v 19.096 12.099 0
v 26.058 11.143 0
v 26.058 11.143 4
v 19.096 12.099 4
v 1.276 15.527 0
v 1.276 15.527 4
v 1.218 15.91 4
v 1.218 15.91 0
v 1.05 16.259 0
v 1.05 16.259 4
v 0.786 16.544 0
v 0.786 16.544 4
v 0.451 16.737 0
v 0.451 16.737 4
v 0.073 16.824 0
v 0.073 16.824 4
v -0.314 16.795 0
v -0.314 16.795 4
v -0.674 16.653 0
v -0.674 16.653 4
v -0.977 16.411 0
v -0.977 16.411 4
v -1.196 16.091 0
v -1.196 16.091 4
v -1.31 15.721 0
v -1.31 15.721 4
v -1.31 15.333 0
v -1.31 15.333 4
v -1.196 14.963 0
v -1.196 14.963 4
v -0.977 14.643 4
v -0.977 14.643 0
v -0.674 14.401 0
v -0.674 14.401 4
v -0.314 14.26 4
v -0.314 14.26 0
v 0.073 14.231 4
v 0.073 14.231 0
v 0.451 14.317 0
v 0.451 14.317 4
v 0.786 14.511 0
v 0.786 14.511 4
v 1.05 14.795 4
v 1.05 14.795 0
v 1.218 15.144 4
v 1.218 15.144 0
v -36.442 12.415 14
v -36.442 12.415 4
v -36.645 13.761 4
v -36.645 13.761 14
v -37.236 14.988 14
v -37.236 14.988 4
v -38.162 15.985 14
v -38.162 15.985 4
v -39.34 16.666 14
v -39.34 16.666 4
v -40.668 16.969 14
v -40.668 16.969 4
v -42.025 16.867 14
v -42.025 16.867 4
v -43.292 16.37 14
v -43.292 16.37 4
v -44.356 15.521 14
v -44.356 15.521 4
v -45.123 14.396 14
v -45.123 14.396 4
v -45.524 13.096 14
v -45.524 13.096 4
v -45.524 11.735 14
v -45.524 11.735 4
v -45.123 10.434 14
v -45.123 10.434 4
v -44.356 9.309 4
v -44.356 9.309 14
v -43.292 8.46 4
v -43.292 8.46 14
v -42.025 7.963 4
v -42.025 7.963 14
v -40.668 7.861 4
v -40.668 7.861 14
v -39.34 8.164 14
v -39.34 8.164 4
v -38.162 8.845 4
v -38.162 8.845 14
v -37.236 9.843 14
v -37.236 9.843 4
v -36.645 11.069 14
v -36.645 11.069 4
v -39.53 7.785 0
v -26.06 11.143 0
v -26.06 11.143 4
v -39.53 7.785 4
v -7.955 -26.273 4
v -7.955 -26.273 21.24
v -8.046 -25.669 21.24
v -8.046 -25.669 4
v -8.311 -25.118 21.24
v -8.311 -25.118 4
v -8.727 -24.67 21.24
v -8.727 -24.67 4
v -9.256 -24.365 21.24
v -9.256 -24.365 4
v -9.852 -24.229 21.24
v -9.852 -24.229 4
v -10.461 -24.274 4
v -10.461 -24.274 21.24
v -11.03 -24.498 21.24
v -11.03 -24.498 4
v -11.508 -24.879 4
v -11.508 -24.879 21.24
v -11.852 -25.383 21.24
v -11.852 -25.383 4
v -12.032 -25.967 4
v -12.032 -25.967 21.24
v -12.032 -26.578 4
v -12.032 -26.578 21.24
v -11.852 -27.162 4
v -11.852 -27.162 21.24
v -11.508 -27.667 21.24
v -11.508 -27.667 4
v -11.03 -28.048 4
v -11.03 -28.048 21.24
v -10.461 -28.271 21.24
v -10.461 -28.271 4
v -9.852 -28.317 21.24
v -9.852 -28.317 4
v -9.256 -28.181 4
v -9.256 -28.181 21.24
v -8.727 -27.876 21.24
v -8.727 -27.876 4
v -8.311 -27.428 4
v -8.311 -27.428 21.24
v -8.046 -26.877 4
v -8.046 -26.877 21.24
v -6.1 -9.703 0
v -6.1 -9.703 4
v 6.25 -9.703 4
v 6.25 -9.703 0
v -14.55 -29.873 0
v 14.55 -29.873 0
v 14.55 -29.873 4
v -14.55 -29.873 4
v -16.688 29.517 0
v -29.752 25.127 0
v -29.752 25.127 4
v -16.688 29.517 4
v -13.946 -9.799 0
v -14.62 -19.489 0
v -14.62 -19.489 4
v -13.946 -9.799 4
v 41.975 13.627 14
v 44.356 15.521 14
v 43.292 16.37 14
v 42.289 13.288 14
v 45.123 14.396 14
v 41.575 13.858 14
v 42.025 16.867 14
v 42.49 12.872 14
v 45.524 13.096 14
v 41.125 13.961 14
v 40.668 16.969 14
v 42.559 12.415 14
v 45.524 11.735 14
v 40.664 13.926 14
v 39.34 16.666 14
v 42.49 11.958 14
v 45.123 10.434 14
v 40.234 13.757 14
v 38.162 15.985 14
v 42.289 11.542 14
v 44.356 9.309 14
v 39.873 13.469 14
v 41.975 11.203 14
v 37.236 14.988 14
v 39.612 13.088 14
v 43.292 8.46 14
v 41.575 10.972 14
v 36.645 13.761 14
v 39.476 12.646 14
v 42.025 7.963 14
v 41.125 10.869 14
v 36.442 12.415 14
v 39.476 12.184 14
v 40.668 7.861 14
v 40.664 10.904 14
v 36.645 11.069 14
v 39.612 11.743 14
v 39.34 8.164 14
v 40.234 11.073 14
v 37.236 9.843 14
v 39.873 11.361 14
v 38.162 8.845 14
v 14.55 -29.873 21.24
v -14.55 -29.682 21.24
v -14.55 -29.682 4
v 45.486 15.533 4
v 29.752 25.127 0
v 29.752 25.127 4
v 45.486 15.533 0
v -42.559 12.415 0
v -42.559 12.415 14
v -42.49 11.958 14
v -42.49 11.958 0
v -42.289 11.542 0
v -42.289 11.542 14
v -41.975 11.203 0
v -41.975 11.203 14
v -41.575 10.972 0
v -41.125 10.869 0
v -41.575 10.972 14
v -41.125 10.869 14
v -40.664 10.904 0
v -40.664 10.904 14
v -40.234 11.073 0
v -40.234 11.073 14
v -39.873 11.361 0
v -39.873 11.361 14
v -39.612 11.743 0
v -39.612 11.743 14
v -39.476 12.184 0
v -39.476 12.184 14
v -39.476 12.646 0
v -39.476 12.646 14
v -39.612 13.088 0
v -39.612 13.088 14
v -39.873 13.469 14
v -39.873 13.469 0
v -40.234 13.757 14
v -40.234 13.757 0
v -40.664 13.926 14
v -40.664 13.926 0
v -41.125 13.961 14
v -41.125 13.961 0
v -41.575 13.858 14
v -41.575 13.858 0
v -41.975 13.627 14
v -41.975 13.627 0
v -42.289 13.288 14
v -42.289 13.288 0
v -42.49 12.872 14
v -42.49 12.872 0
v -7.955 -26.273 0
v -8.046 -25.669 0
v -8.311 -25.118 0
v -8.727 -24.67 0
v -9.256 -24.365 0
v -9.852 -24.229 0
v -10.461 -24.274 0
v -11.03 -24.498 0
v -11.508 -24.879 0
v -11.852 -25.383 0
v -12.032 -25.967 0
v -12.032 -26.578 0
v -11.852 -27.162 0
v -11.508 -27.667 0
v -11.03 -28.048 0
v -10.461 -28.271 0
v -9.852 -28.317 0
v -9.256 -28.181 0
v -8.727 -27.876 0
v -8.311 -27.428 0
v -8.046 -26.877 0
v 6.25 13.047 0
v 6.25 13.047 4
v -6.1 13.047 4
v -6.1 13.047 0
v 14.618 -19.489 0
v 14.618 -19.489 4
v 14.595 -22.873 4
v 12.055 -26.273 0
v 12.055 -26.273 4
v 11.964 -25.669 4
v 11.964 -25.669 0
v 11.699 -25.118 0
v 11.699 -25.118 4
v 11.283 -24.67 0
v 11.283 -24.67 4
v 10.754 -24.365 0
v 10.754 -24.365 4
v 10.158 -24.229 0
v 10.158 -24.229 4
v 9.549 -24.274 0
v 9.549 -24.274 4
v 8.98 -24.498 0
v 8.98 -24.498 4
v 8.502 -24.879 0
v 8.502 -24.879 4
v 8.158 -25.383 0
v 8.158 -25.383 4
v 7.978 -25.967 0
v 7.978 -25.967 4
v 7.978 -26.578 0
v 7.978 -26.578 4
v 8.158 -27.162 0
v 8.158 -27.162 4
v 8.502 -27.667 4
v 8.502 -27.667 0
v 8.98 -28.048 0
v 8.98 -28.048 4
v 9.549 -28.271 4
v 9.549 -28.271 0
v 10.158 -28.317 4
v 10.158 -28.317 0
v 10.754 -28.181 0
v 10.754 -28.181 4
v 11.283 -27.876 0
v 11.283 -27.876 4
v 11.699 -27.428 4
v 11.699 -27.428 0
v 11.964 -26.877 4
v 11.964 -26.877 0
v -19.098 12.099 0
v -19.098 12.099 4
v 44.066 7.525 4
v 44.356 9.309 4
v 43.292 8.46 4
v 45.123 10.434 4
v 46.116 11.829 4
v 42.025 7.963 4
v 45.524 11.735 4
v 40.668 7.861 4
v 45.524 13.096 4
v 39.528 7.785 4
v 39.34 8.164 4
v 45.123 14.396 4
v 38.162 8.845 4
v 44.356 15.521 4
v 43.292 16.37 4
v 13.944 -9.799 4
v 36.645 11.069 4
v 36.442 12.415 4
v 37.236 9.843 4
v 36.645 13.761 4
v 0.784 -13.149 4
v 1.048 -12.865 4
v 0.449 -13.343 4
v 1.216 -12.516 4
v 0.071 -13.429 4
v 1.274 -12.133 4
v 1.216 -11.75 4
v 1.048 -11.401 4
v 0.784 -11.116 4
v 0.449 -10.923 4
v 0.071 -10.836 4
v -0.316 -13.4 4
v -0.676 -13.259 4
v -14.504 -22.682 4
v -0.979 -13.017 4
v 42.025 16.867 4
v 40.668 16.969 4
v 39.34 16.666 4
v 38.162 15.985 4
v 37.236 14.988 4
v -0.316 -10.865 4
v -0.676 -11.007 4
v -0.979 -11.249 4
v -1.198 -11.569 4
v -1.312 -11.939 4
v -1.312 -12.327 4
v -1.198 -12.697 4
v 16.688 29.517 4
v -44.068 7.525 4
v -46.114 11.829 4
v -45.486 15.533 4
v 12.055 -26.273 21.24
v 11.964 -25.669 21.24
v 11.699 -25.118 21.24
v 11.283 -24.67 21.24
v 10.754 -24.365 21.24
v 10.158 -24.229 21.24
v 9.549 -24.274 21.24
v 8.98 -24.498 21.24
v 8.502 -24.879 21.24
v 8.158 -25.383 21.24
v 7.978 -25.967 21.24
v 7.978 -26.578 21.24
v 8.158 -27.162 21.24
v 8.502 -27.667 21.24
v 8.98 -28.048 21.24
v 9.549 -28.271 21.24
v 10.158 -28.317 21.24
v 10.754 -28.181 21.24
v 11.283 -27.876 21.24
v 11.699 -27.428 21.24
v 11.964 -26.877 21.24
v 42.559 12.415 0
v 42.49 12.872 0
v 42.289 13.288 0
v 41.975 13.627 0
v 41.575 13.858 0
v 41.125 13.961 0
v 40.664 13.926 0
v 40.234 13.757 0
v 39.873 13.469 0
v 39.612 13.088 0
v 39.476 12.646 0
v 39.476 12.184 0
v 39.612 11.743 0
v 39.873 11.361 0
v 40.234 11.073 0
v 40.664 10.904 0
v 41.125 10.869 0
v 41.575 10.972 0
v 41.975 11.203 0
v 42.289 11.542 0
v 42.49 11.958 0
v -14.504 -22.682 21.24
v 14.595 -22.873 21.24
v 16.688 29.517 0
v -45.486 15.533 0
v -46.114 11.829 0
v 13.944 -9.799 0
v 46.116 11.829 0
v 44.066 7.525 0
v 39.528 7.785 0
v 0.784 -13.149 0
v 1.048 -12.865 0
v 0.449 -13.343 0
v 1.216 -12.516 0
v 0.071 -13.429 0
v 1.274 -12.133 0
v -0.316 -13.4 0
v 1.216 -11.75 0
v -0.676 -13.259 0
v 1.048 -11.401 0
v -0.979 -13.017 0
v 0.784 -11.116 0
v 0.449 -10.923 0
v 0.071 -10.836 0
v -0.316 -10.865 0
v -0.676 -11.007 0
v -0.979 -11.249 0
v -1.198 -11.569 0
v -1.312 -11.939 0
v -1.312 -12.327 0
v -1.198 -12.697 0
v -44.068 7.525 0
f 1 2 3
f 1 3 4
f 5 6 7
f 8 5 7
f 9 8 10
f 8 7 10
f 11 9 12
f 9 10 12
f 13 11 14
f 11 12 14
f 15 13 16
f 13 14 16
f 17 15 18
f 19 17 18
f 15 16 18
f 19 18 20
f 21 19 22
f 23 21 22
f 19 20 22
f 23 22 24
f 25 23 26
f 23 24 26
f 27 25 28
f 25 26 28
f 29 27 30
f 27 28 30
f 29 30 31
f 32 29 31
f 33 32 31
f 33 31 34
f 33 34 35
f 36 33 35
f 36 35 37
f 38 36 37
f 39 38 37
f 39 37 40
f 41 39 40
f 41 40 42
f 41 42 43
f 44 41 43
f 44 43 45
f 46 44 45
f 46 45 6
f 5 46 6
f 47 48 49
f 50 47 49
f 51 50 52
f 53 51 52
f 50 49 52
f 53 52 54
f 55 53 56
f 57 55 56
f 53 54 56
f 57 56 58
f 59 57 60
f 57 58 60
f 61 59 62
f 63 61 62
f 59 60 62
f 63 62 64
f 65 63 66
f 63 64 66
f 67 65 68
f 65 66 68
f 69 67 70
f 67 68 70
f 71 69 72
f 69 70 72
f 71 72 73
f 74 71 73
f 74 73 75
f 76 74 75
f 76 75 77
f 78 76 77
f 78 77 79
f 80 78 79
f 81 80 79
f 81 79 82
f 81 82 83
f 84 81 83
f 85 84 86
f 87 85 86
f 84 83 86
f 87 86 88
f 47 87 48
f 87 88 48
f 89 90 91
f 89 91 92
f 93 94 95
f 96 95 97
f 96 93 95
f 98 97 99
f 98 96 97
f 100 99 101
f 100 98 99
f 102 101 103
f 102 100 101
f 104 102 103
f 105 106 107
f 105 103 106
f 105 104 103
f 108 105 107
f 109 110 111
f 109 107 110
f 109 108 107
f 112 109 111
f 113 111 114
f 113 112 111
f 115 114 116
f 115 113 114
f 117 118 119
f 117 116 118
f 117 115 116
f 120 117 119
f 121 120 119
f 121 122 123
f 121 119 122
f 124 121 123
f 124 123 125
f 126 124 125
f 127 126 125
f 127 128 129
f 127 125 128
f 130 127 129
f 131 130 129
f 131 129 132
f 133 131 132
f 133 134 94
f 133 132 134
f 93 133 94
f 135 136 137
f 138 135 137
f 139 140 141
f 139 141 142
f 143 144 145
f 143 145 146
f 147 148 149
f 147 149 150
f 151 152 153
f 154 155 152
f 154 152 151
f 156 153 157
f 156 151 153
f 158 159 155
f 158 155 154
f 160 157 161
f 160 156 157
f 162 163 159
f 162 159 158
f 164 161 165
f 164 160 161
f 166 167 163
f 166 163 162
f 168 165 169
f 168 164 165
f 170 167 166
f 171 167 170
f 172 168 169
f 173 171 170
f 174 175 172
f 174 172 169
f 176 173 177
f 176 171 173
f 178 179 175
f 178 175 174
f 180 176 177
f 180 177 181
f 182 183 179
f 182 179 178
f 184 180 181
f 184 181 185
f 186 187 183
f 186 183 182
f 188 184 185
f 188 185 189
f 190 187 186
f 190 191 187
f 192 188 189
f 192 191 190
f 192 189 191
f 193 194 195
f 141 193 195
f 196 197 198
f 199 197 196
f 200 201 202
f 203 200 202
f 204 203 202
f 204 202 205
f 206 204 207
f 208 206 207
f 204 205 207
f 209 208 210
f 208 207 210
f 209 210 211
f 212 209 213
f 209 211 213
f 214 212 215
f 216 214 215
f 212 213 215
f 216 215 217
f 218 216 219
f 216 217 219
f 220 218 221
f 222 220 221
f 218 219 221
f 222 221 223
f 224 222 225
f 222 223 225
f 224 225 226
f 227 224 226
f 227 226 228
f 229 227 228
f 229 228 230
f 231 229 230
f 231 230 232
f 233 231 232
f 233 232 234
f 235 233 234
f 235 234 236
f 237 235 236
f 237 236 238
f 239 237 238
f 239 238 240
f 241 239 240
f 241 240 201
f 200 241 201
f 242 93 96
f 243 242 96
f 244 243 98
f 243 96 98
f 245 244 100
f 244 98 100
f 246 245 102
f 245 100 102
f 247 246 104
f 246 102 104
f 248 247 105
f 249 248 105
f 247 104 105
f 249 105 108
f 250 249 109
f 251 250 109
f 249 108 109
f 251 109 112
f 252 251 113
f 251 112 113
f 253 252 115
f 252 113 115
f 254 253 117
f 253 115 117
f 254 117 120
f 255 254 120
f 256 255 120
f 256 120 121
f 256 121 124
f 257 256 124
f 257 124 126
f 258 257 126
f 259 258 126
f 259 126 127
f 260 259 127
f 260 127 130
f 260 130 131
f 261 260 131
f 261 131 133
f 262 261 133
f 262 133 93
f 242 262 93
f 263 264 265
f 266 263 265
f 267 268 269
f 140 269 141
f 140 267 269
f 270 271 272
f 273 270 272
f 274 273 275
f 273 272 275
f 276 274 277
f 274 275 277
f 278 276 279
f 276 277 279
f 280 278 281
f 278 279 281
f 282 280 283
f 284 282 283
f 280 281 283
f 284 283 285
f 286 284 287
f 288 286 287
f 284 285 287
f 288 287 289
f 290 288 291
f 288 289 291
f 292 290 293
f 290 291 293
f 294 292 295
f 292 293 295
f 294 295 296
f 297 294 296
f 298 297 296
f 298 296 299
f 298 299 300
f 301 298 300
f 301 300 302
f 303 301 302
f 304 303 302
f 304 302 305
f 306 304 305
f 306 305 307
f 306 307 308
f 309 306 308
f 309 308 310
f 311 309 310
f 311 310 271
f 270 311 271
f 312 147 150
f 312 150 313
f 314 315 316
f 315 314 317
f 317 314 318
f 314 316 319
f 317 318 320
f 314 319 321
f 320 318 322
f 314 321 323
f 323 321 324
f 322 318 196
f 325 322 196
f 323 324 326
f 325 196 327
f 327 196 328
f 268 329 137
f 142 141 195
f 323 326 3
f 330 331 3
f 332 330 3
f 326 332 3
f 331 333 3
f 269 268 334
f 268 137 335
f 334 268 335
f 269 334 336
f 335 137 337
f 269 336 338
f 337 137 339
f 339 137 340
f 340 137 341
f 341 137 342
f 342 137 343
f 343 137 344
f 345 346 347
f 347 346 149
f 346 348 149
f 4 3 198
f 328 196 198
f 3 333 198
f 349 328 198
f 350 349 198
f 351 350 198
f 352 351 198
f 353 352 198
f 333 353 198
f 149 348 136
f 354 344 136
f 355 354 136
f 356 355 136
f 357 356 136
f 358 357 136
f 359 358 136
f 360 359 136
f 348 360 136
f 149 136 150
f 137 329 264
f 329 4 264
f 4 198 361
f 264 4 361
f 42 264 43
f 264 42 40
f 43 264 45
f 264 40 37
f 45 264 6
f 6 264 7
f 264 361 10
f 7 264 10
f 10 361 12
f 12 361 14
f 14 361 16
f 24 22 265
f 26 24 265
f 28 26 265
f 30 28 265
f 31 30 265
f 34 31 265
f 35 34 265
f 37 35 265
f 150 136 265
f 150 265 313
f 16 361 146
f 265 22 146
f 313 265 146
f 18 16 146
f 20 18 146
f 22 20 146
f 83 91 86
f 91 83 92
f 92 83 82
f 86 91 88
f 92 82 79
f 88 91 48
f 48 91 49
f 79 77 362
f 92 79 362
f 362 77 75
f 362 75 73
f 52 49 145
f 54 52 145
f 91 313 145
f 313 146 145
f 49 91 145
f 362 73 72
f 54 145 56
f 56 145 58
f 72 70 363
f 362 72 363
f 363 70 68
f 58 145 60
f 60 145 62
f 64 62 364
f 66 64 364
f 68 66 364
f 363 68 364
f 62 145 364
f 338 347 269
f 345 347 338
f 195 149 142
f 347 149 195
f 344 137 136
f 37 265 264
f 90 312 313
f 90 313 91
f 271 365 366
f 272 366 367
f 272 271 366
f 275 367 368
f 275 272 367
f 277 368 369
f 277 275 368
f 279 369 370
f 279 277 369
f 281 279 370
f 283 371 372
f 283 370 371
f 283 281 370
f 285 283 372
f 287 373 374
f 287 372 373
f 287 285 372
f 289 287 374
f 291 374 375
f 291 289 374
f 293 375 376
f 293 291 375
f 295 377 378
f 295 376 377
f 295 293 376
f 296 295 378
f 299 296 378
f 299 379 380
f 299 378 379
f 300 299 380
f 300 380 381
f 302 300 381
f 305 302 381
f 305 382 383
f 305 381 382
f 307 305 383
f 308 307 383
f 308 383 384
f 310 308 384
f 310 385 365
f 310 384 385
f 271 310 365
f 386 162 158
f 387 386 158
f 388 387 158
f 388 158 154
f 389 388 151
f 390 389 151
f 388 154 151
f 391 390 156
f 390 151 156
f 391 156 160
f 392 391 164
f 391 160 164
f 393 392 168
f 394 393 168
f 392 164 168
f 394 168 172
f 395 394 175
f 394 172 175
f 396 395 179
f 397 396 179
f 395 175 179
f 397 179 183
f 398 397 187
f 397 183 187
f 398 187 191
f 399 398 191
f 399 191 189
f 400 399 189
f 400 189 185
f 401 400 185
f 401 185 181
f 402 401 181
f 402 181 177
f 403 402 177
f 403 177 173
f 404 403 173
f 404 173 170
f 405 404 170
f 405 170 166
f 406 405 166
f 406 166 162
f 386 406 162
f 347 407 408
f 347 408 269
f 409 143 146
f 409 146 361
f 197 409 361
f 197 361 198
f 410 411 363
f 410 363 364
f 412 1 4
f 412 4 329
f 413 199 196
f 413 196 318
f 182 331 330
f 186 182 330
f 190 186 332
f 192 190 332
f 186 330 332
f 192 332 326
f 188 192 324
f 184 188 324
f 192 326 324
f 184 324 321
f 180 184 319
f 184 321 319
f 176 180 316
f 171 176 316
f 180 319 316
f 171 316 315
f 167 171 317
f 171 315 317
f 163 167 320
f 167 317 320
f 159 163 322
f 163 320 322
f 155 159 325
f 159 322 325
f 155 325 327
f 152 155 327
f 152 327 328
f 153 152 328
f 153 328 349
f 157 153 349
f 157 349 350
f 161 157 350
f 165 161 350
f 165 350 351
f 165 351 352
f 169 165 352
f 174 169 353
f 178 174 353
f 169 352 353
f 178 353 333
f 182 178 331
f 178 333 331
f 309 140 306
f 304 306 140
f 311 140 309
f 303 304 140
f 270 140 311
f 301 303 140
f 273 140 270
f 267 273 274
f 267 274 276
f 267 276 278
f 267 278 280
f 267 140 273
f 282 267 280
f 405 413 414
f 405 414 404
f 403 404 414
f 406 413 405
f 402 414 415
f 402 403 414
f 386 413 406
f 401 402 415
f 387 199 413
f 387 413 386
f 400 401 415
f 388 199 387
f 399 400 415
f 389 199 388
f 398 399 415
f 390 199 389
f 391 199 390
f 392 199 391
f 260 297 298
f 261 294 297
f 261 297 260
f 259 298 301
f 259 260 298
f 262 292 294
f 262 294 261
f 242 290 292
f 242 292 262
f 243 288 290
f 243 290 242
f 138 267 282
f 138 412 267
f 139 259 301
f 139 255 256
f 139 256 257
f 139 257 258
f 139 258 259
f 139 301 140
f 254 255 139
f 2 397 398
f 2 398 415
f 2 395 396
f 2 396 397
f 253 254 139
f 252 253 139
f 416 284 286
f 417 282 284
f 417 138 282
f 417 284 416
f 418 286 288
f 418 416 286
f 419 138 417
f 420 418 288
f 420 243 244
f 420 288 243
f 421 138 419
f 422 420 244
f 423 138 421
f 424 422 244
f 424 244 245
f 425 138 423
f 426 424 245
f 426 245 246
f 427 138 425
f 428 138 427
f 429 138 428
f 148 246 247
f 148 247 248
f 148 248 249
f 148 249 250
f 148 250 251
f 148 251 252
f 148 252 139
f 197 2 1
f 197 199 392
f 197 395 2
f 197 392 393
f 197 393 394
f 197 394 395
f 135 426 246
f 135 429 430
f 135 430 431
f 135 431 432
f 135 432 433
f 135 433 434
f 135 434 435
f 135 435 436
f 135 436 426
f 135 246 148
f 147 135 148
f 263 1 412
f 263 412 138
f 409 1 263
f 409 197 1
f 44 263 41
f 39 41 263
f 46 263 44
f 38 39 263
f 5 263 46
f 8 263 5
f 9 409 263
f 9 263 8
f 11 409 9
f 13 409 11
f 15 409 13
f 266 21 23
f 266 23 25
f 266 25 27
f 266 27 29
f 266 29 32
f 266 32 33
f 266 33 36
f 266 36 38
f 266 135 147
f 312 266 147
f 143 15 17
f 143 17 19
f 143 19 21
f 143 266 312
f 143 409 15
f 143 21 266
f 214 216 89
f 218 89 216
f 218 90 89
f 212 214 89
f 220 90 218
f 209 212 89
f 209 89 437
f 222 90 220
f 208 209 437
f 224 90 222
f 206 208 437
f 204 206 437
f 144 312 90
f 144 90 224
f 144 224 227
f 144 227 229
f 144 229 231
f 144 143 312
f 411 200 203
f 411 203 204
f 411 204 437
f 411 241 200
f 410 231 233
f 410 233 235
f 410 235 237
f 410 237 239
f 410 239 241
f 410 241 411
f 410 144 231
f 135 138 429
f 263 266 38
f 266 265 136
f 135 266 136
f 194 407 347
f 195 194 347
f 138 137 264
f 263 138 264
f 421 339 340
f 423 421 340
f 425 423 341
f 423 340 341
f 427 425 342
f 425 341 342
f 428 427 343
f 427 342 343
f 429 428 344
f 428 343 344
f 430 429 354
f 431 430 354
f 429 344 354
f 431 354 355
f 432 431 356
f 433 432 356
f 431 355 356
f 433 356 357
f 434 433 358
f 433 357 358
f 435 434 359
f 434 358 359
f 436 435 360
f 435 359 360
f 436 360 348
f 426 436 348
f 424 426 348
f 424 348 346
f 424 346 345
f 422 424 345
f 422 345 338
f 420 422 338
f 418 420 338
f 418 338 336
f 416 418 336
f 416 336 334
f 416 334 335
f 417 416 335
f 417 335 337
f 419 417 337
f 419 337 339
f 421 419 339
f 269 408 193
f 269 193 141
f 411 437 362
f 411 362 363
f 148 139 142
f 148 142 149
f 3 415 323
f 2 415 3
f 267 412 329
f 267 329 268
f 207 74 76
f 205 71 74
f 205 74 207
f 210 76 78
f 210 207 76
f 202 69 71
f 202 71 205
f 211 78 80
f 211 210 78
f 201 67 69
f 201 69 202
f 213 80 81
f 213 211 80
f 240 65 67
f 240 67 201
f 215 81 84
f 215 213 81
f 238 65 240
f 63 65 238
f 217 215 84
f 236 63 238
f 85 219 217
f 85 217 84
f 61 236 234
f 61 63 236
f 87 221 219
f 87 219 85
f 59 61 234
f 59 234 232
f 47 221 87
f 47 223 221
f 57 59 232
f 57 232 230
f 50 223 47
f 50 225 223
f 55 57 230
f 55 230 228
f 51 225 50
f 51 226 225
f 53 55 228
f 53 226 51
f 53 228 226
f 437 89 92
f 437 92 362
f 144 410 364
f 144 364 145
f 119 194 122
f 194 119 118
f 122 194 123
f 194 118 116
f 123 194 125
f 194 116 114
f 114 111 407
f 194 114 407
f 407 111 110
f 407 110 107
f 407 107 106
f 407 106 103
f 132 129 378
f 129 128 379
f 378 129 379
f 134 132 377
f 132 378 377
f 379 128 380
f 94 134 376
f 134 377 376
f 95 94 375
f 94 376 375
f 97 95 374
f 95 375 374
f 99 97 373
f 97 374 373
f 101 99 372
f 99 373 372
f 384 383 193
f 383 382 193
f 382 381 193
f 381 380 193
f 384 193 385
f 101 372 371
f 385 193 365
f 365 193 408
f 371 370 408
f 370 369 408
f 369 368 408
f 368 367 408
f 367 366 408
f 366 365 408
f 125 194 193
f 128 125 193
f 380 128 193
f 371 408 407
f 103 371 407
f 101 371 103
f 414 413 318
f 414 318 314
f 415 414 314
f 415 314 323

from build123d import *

# Parameters (mm, degrees)
BOSS_EXTRUDE1_DEPTH = 4
SKETCH2_W           = 12.35
SKETCH2_H           = 22.75
SKETCH2_W_2         = 12.2
SKETCH2_H_2         = 22.6
CUT_EXTRUDE10_DEPTH = 56.09122169
SKETCH6_R           = 4.5665
BOSS_EXTRUDE3_DEPTH = 10
SKETCH4_R           = 2.05
CUT_EXTRUDE11_DEPTH = 9.65
SKETCH15_R          = 1.3
CUT_EXTRUDE13_DEPTH = 9.65
SKETCH20_W          = 17.24
SKETCH20_H          = 7
BOSS_EXTRUDE4_DEPTH = 29.1
SKETCH14_R          = 2.05
CUT_EXTRUDE16_DEPTH = 58.586980363
SKETCH17_R          = 1.55
CUT_EXTRUDE17_DEPTH = 57.701346609


with BuildPart() as part:
    # Sketch1 → Boss-Extrude1 (new body)
    with BuildSketch(Plane.XY):
        Polygon((-16.687663097, 29.51713681), (16.687663097, 29.51713681), (29.751665716, 25.127138307), (45.48566771, 15.533136266), (46.115666453, 11.829137748), (44.06566621, 7.52513699), (39.527662855, 7.785135244), (26.057661336, 11.143136948), (19.095663738, 12.099134391), (13.943658967, -9.798863607), (14.617658977, -19.488863352), (14.549662185, -29.872864189), (-14.549662185, -29.872864189), (-14.619662252, -19.488863352), (-13.945660379, -9.798863607), (-19.097663288, 12.099134391), (-26.059662749, 11.143136948), (-39.529662405, 7.785135244), (-44.067662035, 7.52513699), (-46.113662247, 11.829137748), (-45.485663985, 15.533136266), (-29.75166199, 25.127138307), align=None)
    extrude(amount=BOSS_EXTRUDE1_DEPTH)

    # Sketch2 → Cut-Extrude10 (cut, through all)
    with BuildSketch(Plane.XY.offset(4)):
        with Locations((0.075, 1.67213681)):
            Rectangle(SKETCH2_W, SKETCH2_H)
        with Locations((0, 1.74713681)):
            Rectangle(SKETCH2_W_2, SKETCH2_H_2)
    extrude(amount=-CUT_EXTRUDE10_DEPTH, mode=Mode.SUBTRACT)

    # Sketch6 → Boss-Extrude3 (add)
    with BuildSketch(Plane.XY.offset(4)):
        with Locations((-41.008819859, 12.415108178)):
            Circle(SKETCH6_R)
        with Locations(Location((41.008819859, 12.415108178, 0), (0, 0, 180))):
            Circle(SKETCH6_R)
    extrude(amount=BOSS_EXTRUDE3_DEPTH)

    # Sketch4 → Cut-Extrude11 (cut)
    with BuildSketch(Plane.XY.offset(4)):
        with Locations((10.005, -26.272864189)):
            Circle(SKETCH4_R)
        with Locations((-10.005, -26.272864189)):
            Circle(SKETCH4_R)
    extrude(amount=-CUT_EXTRUDE11_DEPTH, mode=Mode.SUBTRACT)

    # Sketch15 → Cut-Extrude13 (cut)
    with BuildSketch(Plane.XY.offset(4)):
        with Locations((-0.026341033, -12.13286319)):
            Circle(SKETCH15_R)
        with Locations((-0.024336262, 15.52713681)):
            Circle(SKETCH15_R)
    extrude(amount=-CUT_EXTRUDE13_DEPTH, mode=Mode.SUBTRACT)

    # Sketch20 → Boss-Extrude4 (add)
    with BuildSketch(Plane(origin=(14.744644235, -0.096551274, 0), x_dir=(0, 0, -1), z_dir=(0.9999785610524021, -0.006548086405005186, 0))):
        with Locations((-12.62, -26.276951301)):
            Rectangle(SKETCH20_W, SKETCH20_H)
    extrude(amount=-BOSS_EXTRUDE4_DEPTH)

    # Sketch14 → Cut-Extrude16 (cut, through all)
    with BuildSketch(Plane.XY.offset(4)):
        with Locations((-10.005, -26.272864189)):
            Circle(SKETCH14_R)
        with Locations((10.005, -26.272864189)):
            Circle(SKETCH14_R)
    extrude(amount=CUT_EXTRUDE16_DEPTH, mode=Mode.SUBTRACT)

    # Sketch17 → Cut-Extrude17 (cut, through all)
    with BuildSketch(Plane.XY.offset(14)):
        with Locations((41.008819859, 12.415108178)):
            Circle(SKETCH17_R)
        with Locations(Location((-41.008819859, 12.415108178, 0), (0, 0, 180))):
            Circle(SKETCH17_R)
    extrude(amount=-CUT_EXTRUDE17_DEPTH, mode=Mode.SUBTRACT)


solid = part.part
